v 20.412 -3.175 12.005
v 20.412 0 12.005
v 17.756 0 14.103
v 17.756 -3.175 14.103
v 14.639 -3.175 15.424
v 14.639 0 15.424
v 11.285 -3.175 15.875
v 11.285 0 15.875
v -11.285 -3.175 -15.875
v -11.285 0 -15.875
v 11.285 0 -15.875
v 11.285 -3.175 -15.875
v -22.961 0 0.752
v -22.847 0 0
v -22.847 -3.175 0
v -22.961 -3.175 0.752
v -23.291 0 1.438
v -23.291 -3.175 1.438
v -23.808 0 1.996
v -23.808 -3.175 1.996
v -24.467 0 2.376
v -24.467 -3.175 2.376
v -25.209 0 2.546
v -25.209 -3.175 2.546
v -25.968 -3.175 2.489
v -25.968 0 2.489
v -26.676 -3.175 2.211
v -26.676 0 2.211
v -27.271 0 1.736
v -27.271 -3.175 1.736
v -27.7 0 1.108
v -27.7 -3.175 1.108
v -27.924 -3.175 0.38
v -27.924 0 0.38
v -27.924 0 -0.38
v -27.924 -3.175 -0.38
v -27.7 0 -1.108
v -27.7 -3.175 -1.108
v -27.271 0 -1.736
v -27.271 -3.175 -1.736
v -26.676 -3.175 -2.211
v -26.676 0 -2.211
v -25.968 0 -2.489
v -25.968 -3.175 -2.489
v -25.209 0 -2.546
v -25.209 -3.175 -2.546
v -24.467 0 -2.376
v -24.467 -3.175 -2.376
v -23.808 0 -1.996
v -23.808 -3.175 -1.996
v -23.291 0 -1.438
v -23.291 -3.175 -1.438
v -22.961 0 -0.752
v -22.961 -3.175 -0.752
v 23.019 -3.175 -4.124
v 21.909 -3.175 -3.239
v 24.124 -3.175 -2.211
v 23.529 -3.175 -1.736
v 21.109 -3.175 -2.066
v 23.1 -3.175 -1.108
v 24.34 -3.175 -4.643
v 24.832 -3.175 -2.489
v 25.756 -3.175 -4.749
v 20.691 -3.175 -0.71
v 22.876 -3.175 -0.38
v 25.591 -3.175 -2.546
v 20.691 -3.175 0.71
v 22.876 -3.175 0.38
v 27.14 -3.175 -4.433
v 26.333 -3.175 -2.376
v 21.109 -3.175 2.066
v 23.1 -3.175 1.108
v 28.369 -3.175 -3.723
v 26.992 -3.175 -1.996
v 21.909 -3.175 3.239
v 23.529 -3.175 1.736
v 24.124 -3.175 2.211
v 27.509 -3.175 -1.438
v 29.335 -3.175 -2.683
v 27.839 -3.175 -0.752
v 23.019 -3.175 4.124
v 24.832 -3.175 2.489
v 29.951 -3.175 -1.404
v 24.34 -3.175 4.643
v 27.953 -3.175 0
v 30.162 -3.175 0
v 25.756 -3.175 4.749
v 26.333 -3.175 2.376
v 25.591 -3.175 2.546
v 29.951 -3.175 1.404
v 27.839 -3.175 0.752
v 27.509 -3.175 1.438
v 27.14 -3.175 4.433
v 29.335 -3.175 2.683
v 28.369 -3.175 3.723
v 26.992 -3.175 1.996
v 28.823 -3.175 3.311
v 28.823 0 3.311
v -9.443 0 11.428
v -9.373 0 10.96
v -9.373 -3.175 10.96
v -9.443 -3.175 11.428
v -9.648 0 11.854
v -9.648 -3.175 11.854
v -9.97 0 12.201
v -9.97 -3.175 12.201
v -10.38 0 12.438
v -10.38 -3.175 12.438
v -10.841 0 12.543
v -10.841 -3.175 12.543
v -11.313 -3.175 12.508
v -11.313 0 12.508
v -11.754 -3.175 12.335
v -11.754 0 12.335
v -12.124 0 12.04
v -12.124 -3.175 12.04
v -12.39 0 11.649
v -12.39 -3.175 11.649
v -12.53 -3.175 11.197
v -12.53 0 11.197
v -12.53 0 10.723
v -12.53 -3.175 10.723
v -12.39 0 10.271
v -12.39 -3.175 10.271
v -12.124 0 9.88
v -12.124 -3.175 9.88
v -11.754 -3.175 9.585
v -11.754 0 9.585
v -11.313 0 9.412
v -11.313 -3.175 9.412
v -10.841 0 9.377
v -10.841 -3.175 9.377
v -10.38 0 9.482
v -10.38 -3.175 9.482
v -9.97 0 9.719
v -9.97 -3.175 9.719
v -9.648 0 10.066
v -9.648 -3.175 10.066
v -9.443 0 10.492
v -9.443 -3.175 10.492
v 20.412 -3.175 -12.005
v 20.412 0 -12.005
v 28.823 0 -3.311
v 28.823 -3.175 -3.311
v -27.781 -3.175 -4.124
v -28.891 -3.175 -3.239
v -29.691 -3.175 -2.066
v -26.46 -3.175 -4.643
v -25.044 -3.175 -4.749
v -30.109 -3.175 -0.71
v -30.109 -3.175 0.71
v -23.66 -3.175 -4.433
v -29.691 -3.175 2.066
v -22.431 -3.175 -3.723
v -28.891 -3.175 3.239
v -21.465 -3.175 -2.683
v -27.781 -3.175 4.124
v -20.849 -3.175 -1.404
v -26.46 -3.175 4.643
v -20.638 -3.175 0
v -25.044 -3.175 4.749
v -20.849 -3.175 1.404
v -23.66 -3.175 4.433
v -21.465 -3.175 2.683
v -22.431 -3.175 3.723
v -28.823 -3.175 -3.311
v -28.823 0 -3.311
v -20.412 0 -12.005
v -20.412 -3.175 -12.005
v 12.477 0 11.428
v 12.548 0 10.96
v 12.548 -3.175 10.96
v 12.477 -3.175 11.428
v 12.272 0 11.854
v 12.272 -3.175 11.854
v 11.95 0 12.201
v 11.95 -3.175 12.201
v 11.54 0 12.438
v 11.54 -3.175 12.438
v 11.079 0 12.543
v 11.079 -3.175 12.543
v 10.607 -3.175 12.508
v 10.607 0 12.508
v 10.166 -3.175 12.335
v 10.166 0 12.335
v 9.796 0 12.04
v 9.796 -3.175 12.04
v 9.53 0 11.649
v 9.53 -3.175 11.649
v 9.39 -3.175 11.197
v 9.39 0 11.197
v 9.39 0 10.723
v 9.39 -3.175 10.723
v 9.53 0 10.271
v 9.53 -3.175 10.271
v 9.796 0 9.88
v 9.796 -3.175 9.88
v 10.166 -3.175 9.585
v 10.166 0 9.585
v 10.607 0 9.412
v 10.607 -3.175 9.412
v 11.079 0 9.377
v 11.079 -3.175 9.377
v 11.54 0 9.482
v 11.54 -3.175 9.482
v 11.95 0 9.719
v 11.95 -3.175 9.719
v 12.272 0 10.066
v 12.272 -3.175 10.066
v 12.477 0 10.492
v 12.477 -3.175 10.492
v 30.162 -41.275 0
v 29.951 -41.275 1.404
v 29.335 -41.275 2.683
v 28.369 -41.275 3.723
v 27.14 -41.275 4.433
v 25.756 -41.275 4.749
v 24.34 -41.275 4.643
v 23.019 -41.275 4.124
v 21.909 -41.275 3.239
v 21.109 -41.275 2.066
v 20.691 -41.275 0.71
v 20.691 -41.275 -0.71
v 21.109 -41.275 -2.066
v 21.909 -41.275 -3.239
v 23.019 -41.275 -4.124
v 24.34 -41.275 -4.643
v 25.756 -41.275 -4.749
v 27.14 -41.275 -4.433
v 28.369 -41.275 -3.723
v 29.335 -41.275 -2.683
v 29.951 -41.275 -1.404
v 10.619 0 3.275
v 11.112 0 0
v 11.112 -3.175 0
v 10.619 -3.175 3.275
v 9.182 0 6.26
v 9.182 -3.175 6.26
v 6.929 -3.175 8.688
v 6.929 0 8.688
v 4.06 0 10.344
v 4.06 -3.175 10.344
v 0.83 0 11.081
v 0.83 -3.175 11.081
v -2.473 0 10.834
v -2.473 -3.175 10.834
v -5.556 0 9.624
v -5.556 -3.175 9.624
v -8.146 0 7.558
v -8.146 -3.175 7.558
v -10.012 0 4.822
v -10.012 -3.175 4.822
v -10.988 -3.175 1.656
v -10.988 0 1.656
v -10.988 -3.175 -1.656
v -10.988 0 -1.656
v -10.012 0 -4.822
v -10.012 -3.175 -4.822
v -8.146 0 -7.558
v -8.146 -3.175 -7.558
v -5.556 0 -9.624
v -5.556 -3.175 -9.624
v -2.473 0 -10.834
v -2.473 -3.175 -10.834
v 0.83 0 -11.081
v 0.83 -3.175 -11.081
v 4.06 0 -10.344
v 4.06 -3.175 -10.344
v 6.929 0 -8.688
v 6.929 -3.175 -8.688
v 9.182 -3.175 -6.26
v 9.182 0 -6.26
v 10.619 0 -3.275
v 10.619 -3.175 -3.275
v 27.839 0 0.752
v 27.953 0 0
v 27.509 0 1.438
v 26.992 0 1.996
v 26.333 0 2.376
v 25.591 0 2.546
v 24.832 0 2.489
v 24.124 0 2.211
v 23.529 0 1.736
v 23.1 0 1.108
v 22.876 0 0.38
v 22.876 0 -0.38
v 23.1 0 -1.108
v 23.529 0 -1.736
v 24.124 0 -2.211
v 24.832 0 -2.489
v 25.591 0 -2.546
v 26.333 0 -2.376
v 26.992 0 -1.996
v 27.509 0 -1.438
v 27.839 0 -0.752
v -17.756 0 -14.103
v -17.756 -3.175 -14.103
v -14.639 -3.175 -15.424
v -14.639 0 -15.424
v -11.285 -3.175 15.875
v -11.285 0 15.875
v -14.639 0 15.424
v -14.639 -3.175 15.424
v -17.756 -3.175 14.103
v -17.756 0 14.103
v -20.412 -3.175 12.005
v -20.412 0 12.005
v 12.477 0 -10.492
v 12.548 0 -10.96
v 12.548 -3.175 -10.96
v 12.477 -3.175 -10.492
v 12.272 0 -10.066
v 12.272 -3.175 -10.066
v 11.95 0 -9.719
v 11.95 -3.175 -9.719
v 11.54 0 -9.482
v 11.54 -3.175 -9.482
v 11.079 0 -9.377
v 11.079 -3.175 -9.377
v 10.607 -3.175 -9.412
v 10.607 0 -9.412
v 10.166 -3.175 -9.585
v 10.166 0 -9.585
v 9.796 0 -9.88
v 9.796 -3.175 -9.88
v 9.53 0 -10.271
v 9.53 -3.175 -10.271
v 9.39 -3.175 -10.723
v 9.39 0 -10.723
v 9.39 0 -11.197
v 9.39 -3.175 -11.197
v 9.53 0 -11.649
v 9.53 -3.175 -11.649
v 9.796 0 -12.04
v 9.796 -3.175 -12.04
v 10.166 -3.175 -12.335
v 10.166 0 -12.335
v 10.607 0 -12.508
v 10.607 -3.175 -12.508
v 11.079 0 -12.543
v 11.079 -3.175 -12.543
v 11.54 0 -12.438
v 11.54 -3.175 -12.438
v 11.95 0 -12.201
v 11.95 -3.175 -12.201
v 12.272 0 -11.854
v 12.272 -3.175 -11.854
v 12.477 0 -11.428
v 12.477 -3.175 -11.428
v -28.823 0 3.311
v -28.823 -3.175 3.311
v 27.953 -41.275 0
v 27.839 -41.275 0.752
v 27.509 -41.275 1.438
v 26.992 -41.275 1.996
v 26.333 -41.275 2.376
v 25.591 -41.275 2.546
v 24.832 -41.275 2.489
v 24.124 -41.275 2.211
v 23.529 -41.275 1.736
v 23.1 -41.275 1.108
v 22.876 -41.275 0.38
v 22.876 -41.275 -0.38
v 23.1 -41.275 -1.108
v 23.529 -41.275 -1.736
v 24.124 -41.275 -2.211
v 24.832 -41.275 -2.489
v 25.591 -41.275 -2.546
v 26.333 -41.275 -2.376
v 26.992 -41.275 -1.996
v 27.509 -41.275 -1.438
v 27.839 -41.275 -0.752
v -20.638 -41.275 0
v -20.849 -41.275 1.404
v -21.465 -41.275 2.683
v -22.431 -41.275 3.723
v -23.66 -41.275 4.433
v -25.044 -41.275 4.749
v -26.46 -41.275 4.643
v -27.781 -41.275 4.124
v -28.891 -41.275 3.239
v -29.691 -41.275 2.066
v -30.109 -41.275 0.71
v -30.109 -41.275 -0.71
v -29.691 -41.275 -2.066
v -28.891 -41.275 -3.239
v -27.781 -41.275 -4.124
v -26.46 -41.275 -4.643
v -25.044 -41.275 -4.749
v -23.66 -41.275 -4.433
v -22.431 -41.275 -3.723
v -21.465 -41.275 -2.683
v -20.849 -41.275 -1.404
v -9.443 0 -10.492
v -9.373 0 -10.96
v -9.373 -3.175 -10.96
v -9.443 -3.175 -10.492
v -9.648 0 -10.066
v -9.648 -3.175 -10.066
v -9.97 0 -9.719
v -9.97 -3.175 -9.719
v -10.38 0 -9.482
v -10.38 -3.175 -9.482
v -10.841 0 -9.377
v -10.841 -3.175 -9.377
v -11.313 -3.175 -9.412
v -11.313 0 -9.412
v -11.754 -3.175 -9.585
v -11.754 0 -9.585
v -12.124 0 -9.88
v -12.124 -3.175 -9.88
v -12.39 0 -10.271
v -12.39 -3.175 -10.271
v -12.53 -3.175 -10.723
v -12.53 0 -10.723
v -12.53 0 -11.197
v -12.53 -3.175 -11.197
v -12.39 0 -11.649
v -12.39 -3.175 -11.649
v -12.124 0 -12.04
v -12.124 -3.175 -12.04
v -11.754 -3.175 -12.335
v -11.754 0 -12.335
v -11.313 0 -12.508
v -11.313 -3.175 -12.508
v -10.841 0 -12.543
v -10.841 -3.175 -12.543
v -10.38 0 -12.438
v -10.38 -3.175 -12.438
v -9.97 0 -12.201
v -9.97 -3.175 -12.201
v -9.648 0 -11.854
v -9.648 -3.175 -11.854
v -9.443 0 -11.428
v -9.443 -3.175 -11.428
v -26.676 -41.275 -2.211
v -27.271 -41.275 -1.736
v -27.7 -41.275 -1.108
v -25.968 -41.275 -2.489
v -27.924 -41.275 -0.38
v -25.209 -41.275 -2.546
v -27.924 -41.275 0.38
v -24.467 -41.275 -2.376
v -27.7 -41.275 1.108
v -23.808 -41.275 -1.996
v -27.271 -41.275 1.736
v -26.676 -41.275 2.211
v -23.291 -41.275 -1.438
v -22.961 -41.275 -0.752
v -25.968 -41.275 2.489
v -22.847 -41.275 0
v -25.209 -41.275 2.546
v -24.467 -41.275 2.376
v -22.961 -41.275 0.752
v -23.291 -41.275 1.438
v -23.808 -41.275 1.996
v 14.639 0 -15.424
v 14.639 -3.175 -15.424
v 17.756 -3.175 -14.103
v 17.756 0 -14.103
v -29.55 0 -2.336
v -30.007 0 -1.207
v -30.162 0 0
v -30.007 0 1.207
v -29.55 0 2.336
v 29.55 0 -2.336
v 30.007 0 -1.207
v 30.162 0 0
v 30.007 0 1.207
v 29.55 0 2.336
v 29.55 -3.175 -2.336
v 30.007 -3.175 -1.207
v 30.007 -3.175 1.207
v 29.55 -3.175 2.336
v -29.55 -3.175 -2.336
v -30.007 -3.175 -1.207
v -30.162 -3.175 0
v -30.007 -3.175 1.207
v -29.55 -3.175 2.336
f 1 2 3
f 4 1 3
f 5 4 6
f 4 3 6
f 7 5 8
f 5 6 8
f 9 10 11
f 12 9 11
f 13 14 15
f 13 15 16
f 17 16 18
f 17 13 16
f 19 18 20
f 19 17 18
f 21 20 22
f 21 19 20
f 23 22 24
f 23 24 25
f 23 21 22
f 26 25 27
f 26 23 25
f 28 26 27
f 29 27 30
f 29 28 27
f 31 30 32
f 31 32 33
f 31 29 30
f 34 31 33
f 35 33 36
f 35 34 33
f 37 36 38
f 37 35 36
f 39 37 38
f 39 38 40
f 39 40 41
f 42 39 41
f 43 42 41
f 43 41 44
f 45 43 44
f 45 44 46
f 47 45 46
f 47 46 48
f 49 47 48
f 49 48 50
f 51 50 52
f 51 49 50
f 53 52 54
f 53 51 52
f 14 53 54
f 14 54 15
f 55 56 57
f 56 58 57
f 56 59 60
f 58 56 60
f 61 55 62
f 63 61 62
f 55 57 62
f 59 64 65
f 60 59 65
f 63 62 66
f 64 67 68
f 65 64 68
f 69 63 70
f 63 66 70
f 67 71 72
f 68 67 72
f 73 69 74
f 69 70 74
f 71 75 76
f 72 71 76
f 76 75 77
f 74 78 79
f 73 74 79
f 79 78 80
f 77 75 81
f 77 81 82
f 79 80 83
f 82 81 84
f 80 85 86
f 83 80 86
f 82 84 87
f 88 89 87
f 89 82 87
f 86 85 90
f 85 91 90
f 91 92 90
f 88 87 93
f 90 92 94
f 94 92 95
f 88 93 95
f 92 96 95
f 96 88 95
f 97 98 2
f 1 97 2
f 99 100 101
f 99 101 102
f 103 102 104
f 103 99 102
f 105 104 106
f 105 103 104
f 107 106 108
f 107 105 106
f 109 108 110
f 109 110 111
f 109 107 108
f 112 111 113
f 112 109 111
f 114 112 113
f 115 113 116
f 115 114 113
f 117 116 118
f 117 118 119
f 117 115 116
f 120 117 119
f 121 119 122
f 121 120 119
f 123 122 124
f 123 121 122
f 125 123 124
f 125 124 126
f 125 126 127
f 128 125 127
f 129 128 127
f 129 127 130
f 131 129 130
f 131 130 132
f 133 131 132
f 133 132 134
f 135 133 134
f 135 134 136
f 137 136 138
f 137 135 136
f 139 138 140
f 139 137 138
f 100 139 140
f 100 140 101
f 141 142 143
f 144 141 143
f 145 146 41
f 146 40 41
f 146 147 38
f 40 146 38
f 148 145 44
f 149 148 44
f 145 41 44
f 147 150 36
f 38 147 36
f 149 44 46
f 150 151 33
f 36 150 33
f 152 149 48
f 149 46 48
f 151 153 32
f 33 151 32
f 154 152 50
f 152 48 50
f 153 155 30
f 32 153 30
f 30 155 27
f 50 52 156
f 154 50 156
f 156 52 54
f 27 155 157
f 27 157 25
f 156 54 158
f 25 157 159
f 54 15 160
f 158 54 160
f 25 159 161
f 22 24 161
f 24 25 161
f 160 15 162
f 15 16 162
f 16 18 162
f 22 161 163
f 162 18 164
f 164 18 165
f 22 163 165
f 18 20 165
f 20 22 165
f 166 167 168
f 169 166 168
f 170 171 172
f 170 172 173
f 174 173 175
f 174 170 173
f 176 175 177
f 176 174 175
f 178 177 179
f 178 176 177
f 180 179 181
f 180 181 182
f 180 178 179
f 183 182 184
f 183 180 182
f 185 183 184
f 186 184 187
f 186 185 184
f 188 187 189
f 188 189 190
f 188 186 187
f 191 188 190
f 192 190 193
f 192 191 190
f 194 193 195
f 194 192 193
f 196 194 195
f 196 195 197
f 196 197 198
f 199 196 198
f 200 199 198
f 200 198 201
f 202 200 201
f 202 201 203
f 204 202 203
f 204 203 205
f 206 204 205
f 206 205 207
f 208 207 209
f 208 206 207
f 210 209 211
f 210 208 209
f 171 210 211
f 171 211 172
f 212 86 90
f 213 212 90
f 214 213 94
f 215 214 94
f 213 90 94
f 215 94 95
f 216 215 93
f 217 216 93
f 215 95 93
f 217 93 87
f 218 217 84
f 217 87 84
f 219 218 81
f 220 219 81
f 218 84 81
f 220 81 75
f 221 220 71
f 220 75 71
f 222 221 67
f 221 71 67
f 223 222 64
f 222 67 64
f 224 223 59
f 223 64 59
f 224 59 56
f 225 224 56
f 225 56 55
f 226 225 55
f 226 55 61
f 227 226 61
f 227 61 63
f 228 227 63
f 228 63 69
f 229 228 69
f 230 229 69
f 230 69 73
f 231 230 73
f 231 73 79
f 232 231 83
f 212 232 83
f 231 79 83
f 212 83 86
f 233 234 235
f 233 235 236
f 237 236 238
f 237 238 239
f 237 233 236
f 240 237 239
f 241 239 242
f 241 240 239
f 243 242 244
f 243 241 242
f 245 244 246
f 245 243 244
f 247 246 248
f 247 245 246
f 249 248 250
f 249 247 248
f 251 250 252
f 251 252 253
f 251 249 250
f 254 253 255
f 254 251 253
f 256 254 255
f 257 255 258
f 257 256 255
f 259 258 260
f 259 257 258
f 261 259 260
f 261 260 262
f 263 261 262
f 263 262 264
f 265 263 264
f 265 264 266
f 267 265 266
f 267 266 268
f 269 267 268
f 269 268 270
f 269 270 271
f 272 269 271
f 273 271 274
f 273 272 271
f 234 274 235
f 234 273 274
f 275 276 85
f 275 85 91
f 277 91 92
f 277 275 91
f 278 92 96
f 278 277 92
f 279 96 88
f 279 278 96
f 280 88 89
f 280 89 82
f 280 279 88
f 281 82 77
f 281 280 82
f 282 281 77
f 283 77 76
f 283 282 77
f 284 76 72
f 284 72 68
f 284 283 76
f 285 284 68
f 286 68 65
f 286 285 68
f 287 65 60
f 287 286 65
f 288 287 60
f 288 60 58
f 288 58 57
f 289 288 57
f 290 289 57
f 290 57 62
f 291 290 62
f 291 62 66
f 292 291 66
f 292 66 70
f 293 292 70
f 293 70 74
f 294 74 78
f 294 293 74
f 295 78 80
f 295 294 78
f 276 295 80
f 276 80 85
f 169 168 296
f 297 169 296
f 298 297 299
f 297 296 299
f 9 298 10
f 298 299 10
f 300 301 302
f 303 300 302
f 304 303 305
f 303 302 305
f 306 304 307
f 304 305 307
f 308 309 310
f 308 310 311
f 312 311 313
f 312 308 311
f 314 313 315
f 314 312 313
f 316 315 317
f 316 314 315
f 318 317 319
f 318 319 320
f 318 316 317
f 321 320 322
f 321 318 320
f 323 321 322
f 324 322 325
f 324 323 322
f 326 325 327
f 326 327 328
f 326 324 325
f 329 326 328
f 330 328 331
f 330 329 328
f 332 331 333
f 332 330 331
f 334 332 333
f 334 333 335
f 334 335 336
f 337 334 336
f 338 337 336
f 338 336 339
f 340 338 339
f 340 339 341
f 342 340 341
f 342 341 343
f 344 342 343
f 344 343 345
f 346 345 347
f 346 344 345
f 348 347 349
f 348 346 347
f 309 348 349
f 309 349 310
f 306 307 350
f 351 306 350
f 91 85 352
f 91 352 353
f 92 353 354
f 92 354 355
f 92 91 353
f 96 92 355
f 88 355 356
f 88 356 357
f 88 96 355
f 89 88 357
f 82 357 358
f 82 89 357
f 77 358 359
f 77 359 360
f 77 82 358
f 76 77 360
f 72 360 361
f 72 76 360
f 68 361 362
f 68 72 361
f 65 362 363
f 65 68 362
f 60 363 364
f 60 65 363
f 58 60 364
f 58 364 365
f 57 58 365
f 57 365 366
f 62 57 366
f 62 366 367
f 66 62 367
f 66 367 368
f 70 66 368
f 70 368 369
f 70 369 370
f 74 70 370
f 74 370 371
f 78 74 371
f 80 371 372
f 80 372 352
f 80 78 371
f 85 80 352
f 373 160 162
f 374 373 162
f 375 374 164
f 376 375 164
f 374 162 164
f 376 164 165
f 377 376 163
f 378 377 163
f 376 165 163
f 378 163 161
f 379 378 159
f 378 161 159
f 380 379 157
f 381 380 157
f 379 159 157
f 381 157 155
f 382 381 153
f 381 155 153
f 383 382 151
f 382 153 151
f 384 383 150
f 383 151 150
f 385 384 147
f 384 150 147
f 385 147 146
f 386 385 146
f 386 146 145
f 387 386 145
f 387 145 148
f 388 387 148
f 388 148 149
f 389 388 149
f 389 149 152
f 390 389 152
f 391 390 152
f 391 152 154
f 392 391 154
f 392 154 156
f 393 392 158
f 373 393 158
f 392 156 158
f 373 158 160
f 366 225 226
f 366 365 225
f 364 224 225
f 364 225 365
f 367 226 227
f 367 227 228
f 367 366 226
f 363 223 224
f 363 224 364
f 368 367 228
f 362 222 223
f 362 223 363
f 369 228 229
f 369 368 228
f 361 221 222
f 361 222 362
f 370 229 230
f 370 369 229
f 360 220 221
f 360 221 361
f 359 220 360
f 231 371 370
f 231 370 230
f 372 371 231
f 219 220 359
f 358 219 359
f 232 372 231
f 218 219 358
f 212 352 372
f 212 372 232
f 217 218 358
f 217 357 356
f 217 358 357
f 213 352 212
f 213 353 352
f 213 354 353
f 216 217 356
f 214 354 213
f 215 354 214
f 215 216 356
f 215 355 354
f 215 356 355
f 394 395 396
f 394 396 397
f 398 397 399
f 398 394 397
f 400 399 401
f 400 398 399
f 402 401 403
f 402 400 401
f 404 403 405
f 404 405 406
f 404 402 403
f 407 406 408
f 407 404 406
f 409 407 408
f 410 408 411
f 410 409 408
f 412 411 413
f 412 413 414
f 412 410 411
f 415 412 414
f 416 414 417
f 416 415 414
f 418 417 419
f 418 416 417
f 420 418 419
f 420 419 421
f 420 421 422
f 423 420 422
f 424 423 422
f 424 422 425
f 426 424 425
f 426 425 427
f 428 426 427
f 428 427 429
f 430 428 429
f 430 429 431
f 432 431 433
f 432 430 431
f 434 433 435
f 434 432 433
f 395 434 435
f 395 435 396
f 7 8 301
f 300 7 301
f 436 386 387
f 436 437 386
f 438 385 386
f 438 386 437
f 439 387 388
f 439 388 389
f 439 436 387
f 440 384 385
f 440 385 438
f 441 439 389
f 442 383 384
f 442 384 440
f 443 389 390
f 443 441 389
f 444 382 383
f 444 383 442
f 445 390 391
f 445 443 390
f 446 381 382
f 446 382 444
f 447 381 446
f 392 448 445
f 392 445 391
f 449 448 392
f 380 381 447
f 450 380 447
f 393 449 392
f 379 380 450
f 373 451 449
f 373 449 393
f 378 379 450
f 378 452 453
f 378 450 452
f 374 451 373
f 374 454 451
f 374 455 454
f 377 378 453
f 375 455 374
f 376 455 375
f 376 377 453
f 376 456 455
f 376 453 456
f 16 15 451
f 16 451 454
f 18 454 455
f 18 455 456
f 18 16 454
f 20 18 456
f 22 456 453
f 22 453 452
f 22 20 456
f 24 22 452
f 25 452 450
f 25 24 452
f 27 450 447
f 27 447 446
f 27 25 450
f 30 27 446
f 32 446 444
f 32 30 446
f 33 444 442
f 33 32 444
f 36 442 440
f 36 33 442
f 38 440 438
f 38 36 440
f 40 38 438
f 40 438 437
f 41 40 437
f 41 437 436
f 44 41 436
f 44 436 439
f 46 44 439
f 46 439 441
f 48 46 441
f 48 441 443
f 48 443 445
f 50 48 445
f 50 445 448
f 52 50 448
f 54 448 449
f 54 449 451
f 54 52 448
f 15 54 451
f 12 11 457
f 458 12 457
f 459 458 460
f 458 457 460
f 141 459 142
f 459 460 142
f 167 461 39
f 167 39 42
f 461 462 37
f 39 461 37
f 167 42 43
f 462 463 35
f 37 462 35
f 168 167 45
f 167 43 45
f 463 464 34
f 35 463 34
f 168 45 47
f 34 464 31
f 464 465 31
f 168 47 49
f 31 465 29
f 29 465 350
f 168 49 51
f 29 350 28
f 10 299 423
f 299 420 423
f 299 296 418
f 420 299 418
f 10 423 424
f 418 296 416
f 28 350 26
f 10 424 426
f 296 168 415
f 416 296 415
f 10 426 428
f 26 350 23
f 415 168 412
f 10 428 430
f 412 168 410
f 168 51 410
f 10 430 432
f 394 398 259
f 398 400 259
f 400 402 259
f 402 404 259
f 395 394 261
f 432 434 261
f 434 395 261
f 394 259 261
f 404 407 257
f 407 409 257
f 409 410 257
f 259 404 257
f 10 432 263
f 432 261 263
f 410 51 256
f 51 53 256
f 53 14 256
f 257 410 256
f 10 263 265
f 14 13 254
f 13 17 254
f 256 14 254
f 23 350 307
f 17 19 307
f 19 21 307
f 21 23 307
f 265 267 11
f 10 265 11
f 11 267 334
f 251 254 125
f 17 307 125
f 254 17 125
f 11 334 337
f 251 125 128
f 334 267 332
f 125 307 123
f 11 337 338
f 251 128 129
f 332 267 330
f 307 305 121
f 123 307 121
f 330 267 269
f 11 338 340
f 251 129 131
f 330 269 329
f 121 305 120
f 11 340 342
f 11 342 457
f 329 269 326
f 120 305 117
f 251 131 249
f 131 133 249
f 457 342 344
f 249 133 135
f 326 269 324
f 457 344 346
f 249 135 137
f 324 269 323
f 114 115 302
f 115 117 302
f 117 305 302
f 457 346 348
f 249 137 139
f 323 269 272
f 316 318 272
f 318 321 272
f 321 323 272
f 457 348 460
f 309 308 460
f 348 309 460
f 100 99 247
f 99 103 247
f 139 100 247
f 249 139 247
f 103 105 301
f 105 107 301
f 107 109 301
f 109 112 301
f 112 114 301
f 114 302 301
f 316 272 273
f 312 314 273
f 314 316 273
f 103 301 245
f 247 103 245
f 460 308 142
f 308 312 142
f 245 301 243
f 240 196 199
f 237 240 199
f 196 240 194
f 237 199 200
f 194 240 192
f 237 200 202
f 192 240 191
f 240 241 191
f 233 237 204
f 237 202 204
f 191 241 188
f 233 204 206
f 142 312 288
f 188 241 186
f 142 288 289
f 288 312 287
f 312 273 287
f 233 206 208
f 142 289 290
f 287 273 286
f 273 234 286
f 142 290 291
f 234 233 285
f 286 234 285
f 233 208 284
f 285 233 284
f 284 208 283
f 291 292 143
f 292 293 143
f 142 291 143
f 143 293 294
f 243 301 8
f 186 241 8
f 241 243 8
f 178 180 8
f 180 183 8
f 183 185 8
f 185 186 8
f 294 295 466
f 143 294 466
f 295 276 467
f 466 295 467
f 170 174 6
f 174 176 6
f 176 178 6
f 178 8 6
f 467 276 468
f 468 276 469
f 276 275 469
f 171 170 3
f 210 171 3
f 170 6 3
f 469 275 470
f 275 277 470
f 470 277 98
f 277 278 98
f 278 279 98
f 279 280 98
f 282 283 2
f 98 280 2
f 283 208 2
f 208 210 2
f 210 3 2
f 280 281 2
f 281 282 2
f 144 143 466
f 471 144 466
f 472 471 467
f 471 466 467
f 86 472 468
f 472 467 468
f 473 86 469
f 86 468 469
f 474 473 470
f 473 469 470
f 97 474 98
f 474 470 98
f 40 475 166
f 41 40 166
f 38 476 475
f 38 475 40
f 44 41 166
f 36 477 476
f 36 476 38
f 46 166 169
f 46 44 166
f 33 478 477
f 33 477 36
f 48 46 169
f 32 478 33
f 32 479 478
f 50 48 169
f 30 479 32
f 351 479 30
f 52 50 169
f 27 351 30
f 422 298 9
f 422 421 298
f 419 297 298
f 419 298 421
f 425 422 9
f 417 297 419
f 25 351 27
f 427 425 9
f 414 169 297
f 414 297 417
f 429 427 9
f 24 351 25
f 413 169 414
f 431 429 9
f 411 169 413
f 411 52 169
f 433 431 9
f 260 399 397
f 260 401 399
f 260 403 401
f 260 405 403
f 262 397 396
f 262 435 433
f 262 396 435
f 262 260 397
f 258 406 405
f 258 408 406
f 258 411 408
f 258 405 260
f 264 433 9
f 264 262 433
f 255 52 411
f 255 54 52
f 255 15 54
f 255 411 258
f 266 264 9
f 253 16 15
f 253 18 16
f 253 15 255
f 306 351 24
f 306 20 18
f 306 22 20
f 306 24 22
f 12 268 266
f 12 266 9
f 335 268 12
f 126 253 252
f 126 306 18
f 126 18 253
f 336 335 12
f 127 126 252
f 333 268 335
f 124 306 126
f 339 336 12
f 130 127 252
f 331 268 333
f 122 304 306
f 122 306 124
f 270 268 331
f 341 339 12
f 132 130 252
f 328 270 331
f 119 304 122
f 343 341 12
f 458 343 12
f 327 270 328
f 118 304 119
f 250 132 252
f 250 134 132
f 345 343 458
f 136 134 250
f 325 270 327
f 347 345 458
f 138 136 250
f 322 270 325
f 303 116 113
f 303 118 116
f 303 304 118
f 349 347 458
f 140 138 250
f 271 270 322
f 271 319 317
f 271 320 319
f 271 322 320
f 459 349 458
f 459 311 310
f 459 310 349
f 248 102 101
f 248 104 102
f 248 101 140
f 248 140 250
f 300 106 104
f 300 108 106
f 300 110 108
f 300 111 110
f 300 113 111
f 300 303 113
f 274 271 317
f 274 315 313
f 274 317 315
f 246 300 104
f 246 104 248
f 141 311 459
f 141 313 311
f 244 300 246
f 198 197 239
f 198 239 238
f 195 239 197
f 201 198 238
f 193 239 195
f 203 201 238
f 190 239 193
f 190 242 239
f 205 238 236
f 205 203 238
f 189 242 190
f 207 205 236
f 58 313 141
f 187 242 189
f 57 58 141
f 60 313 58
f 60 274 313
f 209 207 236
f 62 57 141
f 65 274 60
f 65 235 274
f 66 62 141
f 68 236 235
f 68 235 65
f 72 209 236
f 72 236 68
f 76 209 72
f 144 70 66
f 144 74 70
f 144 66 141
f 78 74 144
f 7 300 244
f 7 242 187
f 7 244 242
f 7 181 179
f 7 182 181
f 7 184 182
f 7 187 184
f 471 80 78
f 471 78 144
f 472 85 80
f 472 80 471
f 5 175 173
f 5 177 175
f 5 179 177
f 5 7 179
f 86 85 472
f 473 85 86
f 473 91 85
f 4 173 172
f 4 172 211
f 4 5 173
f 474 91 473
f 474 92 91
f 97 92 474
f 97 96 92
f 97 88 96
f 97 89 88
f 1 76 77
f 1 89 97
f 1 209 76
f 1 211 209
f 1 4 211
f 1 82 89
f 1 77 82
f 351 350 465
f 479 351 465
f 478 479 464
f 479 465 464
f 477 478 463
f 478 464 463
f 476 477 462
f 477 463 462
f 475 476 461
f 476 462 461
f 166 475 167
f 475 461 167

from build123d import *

# Parameters (mm, degrees)
F0_R     = 1.5875
F0_R_2   = 2.5527
F0_R_3   = 11.1125
F1_DEPTH = 3.175
F2_R     = 4.7625
F2_R_2   = 2.5527
F3_DEPTH = 38.1


with BuildPart() as f1:
    # F0 (on Front) → F1 (new body)
    with BuildSketch(Plane.XZ):
        with BuildLine():
            Line((-20.41235, 12.005275), (-28.822915, 3.311353))
            ThreePointArc((-28.822915, 3.311353), (-30.1625, 0), (-28.822915, -3.311353))
            Line((-28.822915, -3.311353), (-20.41235, -12.005275))
            ThreePointArc((-20.41235, -12.005275), (-16.241669, -14.867615), (-11.284577, -15.875))
            Line((-11.284577, -15.875), (11.284577, -15.875))
            ThreePointArc((11.284577, -15.875), (16.241669, -14.867615), (20.41235, -12.005275))
            Line((20.41235, -12.005275), (28.822915, -3.311353))
            ThreePointArc((28.822915, -3.311353), (30.1625, 0), (28.822915, 3.311353))
            Line((28.822915, 3.311353), (20.41235, 12.005275))
            ThreePointArc((20.41235, 12.005275), (16.241669, 14.867615), (11.284577, 15.875))
            Line((11.284577, 15.875), (-11.284577, 15.875))
            ThreePointArc((-11.284577, 15.875), (-16.241669, 14.867615), (-20.41235, 12.005275))
        make_face()
        with Locations((-10.9601, -10.9601)):
            Circle(F0_R, mode=Mode.SUBTRACT)
        with Locations((10.9601, -10.9601)):
            Circle(F0_R, mode=Mode.SUBTRACT)
        with Locations((-25.4, 0)):
            Circle(F0_R_2, mode=Mode.SUBTRACT)
        Circle(F0_R_3, mode=Mode.SUBTRACT)
        with Locations((-10.9601, 10.9601)):
            Circle(F0_R, mode=Mode.SUBTRACT)
        with Locations((25.4, 0)):
            Circle(F0_R_2, mode=Mode.SUBTRACT)
        with Locations((10.9601, 10.9601)):
            Circle(F0_R, mode=Mode.SUBTRACT)
    extrude(amount=F1_DEPTH)


with BuildPart() as f3:
    # F2 (on face) → F3 (new body)
    with BuildSketch(Plane.XZ.offset(3.175)):
        with Locations((-25.4, 0)):
            Circle(F2_R)
        with Locations((-25.4, 0)):
            Circle(F2_R_2, mode=Mode.SUBTRACT)
        with Locations((25.4, 0)):
            Circle(F2_R)
        with Locations((25.4, 0)):
            Circle(F2_R_2, mode=Mode.SUBTRACT)
    extrude(amount=F3_DEPTH)


solid = Compound([f1.part, f3.part])
